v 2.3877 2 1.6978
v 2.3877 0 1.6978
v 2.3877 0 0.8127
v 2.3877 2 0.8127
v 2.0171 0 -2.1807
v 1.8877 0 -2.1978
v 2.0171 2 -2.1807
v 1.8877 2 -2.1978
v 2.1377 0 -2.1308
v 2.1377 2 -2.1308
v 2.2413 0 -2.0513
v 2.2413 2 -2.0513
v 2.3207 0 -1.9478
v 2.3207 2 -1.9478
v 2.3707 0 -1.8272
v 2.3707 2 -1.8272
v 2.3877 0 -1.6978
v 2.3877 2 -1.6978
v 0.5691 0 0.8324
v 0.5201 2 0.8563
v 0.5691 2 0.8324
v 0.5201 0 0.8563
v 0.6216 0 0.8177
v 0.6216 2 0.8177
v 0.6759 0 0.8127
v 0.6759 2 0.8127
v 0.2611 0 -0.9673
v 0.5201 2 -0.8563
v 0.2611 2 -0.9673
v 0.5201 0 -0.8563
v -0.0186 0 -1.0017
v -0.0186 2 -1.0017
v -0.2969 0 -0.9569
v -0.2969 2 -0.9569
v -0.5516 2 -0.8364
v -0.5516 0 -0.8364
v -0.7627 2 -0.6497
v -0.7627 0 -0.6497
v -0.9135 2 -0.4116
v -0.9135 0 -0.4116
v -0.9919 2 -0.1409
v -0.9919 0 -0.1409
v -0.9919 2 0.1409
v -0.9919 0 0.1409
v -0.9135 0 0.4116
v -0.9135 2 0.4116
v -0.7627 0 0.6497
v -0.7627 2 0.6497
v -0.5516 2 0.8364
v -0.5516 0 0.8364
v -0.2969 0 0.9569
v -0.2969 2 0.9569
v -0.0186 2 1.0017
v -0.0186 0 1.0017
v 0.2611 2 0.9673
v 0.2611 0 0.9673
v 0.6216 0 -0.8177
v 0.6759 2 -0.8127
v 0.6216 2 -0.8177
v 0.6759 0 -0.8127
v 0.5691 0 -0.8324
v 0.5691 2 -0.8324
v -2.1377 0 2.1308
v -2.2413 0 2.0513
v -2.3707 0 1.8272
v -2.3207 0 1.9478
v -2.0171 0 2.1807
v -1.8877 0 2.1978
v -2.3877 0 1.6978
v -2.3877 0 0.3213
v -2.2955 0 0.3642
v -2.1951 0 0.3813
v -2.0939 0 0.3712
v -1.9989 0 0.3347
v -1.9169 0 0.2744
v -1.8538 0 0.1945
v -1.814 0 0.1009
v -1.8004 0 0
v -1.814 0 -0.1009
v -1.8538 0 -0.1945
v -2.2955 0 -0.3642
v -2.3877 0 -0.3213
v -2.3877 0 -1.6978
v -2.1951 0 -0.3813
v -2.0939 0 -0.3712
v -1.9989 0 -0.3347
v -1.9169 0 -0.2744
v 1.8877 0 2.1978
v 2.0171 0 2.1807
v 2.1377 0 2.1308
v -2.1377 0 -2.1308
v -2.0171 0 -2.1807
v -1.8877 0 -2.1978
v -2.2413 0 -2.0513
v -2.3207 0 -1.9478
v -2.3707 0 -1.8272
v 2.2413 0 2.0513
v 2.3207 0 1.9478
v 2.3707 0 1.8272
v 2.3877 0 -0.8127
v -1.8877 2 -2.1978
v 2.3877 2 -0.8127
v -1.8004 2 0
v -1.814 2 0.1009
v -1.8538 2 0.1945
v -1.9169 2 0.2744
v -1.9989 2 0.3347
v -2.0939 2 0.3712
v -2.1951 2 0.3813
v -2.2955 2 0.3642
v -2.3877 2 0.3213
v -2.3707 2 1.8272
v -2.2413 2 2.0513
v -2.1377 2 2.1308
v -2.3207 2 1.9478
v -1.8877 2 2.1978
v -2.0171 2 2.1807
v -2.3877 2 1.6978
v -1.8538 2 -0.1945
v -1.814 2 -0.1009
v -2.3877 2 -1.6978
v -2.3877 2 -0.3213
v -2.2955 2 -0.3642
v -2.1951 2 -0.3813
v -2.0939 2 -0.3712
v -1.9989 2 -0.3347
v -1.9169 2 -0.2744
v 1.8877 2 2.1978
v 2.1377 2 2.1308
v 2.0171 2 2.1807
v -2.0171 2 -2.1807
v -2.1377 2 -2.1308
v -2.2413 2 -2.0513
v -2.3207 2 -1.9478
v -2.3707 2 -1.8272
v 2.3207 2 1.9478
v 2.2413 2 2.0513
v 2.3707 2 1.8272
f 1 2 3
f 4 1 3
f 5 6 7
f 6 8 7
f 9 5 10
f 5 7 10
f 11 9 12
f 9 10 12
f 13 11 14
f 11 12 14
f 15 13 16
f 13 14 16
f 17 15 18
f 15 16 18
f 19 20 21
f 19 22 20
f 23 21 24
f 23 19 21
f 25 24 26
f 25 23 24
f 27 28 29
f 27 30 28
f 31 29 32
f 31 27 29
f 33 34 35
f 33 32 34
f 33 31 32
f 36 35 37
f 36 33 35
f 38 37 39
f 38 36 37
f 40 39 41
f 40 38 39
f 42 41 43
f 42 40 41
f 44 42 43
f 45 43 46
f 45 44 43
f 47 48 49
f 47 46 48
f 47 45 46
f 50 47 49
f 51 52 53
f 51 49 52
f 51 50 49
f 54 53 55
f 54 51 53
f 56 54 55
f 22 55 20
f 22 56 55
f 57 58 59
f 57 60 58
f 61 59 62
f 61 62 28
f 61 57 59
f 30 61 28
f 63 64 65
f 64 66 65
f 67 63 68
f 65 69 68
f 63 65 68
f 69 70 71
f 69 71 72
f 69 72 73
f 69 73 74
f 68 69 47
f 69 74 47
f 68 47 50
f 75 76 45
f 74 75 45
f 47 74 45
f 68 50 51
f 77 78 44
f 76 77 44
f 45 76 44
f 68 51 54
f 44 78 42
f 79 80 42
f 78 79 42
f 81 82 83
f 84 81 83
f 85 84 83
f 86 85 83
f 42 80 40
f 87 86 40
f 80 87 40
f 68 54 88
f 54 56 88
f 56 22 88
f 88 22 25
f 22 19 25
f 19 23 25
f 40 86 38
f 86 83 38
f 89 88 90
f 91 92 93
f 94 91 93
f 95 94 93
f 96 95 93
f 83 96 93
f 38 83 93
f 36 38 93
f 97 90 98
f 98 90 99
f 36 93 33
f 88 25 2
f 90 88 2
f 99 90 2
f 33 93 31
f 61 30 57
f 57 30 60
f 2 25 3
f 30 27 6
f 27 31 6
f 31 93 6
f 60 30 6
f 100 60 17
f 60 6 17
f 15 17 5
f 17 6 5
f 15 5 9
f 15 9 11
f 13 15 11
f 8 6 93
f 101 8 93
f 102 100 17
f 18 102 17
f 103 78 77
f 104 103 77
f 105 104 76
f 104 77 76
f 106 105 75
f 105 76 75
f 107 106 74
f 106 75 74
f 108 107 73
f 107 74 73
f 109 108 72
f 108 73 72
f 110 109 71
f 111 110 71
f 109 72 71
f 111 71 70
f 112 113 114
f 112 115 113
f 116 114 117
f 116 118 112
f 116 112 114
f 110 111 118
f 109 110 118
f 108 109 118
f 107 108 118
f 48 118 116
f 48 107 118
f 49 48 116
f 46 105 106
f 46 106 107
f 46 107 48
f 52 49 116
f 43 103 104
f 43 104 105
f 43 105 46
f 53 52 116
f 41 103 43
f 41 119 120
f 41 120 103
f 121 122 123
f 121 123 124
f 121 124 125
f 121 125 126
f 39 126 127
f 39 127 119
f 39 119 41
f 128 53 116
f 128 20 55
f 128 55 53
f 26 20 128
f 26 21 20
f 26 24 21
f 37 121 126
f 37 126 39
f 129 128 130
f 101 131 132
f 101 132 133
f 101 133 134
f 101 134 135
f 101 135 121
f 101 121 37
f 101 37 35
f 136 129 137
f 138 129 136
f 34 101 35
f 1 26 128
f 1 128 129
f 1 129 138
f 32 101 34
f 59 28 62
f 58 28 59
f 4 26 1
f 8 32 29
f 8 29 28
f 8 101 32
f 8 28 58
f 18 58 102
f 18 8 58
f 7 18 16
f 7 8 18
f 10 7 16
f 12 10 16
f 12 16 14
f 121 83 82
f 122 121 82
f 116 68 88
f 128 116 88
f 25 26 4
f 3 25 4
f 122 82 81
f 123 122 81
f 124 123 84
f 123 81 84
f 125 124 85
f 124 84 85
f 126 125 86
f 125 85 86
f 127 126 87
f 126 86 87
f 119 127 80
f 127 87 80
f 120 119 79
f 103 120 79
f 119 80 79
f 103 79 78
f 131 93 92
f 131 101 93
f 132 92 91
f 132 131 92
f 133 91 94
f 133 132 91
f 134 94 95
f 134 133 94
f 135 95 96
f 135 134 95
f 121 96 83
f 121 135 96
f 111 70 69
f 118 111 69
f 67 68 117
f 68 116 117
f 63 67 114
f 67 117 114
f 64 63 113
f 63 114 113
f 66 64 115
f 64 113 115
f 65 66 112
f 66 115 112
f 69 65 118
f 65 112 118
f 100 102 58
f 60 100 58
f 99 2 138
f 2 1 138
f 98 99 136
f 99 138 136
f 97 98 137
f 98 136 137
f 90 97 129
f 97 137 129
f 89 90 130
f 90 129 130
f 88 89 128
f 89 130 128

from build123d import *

# Parameters (mm, degrees)
SKETCH_4_R          = 1.001902262
EXTRUDE_2_DEPTH     = 2
CUT_EXTRUDE_START   = -2
CUT_EXTRUDE_3_DEPTH = 2
FILLET_1_R          = 0.5
FILLET_2_R          = 0.5
FILLET_3_R          = 0.3
CUT_EXTRUDE_4_DEPTH = 2
FILLET_4_R          = 0.3


with BuildPart() as part:
    # 草圖4 → 填料-伸長2 (new body)
    with BuildSketch(Plane(origin=(0, 0, 0), x_dir=(1, 0, 0), z_dir=(0, 1, 0))):
        with BuildLine():
            Line((2.387720447, 2.197754837), (-2.387720447, 2.197754837))
            Line((-2.387720447, 2.197754837), (-2.387720447, 0.321257975))
            ThreePointArc((-2.387720447, 0.321257975), (-1.998855162, 0.334704624), (-1.800436823, 0))
            ThreePointArc((-1.800436823, 0), (-1.998855162, -0.334704624), (-2.387720447, -0.321257975))
            Line((-2.387720447, -0.321257975), (-2.387720447, -2.197754837))
            Line((-2.387720447, -2.197754837), (2.387720447, -2.197754837))
            Line((2.387720447, -2.197754837), (2.387720447, 2.197754837))
        make_face()
        with Locations(Location((0, 0, 0), (0, 0, 270))):
            Circle(SKETCH_4_R, mode=Mode.SUBTRACT)
    extrude(amount=EXTRUDE_2_DEPTH)

    # 草圖5 → 除料-伸長3 (cut)
    with BuildSketch(Plane(origin=(0, 2, 0), x_dir=(1, 0, 0), z_dir=(0, 1, 0)).offset(CUT_EXTRUDE_START)):
        with BuildLine():
            ThreePointArc((0.834454153, 0.554521785), (0.959127116, 0.289626172), (1.001902262, 0))
            Line((1.001902262, 0), (2.387720447, 0))
            Line((2.387720447, 0), (2.387720447, 0.554521785))
            Line((2.387720447, 0.554521785), (0.834454153, 0.554521785))
        make_face()
        with BuildLine():
            Line((2.387720447, 0), (1.001902262, 0))
            ThreePointArc((1.001902262, 0), (0.959127116, -0.289626172), (0.834454153, -0.554521785))
            Line((0.834454153, -0.554521785), (2.387720447, -0.554521785))
            Line((2.387720447, -0.554521785), (2.387720447, 0))
        make_face()
    extrude(amount=CUT_EXTRUDE_3_DEPTH, mode=Mode.SUBTRACT)

    # 圓角1
    fillet_1_edges = [part.edges().sort_by_distance(p)[0] for p in [
        (2.387720447, 1, -2.197754837),
    ]]
    fillet(fillet_1_edges, radius=FILLET_1_R)

    # 圓角2
    fillet_2_edges = [part.edges().sort_by_distance(p)[0] for p in [
        (-2.387720447, 1, -2.197754837),
        (2.387720447, 1, 2.197754837),
        (-2.387720447, 1, 2.197754837),
    ]]
    fillet(fillet_2_edges, radius=FILLET_2_R)

    # 圓角3
    fillet_3_edges = [part.edges().sort_by_distance(p)[0] for p in [
        (0.834454153, 1, -0.554521785),
        (0.834454153, 1, 0.554521785),
    ]]
    fillet(fillet_3_edges, radius=FILLET_3_R)

    # 草圖6 → 除料-伸長4 (cut)
    with BuildSketch(Plane(origin=(0, 2, 0), x_dir=(1, 0, 0), z_dir=(0, 1, 0))):
        Polygon((0, 0), (0, -0.812711822), (2.387720447, -0.812711822), (2.387720447, 0.812711822), (0, 0.812711822), align=None)
    extrude(amount=-CUT_EXTRUDE_4_DEPTH, mode=Mode.SUBTRACT)

    # 圓角4
    fillet_4_edges = [part.edges().sort_by_distance(p)[0] for p in [
        (0.585924601, 1, -0.812711822),
        (0.585924601, 1, 0.812711822),
    ]]
    fillet(fillet_4_edges, radius=FILLET_4_R)


solid = part.part
